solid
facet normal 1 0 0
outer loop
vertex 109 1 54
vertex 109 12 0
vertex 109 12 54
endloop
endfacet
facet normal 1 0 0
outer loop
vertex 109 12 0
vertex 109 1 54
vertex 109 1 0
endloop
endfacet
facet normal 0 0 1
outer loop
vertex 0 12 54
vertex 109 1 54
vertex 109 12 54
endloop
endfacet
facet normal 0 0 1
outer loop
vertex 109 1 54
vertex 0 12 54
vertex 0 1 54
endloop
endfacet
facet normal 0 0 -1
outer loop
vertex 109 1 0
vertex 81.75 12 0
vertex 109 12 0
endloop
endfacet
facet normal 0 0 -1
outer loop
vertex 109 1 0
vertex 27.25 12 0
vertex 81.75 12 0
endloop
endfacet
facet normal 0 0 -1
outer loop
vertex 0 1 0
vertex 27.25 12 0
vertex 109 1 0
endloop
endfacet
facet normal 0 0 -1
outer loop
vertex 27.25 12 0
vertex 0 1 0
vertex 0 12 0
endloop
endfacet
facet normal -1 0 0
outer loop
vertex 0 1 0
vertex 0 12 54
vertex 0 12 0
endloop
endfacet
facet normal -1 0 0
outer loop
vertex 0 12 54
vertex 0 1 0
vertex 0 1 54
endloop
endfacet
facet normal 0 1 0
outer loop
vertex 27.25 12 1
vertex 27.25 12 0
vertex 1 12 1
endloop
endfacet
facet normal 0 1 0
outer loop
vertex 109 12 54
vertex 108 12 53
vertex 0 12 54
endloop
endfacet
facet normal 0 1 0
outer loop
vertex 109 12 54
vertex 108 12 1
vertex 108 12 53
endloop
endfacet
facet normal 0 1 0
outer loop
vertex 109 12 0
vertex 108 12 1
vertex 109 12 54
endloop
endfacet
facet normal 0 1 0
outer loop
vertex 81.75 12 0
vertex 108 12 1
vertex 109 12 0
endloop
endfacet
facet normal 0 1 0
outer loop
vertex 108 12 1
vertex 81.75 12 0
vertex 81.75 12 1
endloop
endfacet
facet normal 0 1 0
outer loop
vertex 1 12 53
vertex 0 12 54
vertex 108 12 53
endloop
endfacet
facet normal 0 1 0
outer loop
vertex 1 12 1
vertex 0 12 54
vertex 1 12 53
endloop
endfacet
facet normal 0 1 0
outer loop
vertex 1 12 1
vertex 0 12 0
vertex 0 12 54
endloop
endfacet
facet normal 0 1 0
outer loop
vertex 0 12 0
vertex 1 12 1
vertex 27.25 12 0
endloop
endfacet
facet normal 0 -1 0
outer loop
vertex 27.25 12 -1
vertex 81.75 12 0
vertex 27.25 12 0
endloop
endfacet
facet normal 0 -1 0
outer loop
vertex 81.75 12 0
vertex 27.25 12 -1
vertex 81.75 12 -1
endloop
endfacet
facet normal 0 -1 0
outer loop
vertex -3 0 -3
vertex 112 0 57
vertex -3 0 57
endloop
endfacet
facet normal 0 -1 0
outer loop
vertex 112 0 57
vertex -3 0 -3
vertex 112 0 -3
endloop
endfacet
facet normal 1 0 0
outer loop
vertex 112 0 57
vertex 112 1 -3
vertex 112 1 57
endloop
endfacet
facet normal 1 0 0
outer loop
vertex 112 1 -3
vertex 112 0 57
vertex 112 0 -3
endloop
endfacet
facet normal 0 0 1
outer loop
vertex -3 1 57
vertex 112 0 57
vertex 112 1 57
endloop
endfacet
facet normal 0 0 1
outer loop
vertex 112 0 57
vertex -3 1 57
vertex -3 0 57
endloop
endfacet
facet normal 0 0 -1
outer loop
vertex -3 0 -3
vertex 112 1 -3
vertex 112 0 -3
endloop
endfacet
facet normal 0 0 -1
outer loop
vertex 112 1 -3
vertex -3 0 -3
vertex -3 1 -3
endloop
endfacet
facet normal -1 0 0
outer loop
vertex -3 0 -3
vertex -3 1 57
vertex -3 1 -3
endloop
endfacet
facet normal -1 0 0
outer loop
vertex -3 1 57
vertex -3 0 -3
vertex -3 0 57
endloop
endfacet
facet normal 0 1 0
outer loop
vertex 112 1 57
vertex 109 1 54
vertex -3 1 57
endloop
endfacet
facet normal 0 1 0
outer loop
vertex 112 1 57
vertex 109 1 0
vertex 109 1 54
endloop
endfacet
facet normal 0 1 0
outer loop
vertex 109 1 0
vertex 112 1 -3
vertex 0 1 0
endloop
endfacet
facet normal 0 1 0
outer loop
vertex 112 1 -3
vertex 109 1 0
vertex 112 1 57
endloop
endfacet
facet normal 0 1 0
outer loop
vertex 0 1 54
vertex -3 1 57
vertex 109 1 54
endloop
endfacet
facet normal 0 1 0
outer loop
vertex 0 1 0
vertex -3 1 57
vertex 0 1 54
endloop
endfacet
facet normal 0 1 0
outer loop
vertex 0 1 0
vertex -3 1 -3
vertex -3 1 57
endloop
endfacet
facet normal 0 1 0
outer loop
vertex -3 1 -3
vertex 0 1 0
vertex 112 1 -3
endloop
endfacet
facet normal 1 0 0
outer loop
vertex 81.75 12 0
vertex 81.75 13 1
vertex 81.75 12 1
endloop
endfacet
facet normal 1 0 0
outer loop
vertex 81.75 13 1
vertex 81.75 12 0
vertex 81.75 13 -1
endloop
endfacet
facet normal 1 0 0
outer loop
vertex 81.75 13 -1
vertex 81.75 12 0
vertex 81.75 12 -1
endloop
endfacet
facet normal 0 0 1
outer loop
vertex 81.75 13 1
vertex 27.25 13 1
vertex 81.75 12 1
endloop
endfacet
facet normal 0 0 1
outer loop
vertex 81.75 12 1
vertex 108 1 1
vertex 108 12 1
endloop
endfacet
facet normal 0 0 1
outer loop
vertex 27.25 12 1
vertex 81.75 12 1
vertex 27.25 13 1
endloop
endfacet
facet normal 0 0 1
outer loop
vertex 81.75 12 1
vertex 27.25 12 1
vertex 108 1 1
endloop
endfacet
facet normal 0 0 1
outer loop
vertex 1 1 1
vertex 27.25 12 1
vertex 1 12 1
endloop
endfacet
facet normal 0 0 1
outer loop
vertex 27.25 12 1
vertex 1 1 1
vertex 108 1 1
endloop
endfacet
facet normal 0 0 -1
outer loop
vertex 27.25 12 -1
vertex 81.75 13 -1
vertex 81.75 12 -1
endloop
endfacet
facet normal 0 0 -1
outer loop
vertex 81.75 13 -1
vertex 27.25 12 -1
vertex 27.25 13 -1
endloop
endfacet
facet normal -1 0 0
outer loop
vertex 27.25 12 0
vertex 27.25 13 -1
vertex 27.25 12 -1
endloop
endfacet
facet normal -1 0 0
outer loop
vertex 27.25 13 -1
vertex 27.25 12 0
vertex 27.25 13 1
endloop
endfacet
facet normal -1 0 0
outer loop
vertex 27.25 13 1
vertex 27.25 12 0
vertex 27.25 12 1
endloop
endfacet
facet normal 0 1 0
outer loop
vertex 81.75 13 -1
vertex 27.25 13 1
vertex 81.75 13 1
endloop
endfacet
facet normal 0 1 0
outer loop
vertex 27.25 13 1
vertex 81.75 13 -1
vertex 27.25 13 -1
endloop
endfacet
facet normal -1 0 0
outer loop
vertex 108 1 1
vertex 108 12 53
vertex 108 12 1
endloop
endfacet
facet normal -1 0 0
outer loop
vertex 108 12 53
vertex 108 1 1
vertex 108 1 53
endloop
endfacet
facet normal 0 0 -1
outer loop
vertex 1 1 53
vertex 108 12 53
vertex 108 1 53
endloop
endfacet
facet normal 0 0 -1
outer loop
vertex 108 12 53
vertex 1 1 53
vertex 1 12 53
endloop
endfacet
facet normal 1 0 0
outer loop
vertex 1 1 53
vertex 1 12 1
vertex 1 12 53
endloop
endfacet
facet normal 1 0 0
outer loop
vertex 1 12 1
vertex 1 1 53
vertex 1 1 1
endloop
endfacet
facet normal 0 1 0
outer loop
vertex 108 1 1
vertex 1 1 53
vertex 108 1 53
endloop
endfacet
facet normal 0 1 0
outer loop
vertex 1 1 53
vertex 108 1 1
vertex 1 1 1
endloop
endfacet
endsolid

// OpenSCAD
// TV cable cover
// License: MIT
// Maciej Urbański
// rooter@kyberian.net

// dimensions
// 10.9 54; lip 12-17

inf = 9999;
$fn = 100;

module cover(w, h, d, thickness, brim){
    difference(){
        union() {
            cube([w, d, h]);
            translate([-brim, 0, -brim]) cube([w+2*brim, thickness, h+2*brim]);
            
            // lip
            translate([w/4, d, -thickness]) cube([w/2, thickness, thickness*2]);
        }
        translate([thickness, thickness, thickness]) {
            cube([w-2*thickness, d, h-2*thickness]);
        }
    }
}


cover(109, 54, 12, 1, 3);
